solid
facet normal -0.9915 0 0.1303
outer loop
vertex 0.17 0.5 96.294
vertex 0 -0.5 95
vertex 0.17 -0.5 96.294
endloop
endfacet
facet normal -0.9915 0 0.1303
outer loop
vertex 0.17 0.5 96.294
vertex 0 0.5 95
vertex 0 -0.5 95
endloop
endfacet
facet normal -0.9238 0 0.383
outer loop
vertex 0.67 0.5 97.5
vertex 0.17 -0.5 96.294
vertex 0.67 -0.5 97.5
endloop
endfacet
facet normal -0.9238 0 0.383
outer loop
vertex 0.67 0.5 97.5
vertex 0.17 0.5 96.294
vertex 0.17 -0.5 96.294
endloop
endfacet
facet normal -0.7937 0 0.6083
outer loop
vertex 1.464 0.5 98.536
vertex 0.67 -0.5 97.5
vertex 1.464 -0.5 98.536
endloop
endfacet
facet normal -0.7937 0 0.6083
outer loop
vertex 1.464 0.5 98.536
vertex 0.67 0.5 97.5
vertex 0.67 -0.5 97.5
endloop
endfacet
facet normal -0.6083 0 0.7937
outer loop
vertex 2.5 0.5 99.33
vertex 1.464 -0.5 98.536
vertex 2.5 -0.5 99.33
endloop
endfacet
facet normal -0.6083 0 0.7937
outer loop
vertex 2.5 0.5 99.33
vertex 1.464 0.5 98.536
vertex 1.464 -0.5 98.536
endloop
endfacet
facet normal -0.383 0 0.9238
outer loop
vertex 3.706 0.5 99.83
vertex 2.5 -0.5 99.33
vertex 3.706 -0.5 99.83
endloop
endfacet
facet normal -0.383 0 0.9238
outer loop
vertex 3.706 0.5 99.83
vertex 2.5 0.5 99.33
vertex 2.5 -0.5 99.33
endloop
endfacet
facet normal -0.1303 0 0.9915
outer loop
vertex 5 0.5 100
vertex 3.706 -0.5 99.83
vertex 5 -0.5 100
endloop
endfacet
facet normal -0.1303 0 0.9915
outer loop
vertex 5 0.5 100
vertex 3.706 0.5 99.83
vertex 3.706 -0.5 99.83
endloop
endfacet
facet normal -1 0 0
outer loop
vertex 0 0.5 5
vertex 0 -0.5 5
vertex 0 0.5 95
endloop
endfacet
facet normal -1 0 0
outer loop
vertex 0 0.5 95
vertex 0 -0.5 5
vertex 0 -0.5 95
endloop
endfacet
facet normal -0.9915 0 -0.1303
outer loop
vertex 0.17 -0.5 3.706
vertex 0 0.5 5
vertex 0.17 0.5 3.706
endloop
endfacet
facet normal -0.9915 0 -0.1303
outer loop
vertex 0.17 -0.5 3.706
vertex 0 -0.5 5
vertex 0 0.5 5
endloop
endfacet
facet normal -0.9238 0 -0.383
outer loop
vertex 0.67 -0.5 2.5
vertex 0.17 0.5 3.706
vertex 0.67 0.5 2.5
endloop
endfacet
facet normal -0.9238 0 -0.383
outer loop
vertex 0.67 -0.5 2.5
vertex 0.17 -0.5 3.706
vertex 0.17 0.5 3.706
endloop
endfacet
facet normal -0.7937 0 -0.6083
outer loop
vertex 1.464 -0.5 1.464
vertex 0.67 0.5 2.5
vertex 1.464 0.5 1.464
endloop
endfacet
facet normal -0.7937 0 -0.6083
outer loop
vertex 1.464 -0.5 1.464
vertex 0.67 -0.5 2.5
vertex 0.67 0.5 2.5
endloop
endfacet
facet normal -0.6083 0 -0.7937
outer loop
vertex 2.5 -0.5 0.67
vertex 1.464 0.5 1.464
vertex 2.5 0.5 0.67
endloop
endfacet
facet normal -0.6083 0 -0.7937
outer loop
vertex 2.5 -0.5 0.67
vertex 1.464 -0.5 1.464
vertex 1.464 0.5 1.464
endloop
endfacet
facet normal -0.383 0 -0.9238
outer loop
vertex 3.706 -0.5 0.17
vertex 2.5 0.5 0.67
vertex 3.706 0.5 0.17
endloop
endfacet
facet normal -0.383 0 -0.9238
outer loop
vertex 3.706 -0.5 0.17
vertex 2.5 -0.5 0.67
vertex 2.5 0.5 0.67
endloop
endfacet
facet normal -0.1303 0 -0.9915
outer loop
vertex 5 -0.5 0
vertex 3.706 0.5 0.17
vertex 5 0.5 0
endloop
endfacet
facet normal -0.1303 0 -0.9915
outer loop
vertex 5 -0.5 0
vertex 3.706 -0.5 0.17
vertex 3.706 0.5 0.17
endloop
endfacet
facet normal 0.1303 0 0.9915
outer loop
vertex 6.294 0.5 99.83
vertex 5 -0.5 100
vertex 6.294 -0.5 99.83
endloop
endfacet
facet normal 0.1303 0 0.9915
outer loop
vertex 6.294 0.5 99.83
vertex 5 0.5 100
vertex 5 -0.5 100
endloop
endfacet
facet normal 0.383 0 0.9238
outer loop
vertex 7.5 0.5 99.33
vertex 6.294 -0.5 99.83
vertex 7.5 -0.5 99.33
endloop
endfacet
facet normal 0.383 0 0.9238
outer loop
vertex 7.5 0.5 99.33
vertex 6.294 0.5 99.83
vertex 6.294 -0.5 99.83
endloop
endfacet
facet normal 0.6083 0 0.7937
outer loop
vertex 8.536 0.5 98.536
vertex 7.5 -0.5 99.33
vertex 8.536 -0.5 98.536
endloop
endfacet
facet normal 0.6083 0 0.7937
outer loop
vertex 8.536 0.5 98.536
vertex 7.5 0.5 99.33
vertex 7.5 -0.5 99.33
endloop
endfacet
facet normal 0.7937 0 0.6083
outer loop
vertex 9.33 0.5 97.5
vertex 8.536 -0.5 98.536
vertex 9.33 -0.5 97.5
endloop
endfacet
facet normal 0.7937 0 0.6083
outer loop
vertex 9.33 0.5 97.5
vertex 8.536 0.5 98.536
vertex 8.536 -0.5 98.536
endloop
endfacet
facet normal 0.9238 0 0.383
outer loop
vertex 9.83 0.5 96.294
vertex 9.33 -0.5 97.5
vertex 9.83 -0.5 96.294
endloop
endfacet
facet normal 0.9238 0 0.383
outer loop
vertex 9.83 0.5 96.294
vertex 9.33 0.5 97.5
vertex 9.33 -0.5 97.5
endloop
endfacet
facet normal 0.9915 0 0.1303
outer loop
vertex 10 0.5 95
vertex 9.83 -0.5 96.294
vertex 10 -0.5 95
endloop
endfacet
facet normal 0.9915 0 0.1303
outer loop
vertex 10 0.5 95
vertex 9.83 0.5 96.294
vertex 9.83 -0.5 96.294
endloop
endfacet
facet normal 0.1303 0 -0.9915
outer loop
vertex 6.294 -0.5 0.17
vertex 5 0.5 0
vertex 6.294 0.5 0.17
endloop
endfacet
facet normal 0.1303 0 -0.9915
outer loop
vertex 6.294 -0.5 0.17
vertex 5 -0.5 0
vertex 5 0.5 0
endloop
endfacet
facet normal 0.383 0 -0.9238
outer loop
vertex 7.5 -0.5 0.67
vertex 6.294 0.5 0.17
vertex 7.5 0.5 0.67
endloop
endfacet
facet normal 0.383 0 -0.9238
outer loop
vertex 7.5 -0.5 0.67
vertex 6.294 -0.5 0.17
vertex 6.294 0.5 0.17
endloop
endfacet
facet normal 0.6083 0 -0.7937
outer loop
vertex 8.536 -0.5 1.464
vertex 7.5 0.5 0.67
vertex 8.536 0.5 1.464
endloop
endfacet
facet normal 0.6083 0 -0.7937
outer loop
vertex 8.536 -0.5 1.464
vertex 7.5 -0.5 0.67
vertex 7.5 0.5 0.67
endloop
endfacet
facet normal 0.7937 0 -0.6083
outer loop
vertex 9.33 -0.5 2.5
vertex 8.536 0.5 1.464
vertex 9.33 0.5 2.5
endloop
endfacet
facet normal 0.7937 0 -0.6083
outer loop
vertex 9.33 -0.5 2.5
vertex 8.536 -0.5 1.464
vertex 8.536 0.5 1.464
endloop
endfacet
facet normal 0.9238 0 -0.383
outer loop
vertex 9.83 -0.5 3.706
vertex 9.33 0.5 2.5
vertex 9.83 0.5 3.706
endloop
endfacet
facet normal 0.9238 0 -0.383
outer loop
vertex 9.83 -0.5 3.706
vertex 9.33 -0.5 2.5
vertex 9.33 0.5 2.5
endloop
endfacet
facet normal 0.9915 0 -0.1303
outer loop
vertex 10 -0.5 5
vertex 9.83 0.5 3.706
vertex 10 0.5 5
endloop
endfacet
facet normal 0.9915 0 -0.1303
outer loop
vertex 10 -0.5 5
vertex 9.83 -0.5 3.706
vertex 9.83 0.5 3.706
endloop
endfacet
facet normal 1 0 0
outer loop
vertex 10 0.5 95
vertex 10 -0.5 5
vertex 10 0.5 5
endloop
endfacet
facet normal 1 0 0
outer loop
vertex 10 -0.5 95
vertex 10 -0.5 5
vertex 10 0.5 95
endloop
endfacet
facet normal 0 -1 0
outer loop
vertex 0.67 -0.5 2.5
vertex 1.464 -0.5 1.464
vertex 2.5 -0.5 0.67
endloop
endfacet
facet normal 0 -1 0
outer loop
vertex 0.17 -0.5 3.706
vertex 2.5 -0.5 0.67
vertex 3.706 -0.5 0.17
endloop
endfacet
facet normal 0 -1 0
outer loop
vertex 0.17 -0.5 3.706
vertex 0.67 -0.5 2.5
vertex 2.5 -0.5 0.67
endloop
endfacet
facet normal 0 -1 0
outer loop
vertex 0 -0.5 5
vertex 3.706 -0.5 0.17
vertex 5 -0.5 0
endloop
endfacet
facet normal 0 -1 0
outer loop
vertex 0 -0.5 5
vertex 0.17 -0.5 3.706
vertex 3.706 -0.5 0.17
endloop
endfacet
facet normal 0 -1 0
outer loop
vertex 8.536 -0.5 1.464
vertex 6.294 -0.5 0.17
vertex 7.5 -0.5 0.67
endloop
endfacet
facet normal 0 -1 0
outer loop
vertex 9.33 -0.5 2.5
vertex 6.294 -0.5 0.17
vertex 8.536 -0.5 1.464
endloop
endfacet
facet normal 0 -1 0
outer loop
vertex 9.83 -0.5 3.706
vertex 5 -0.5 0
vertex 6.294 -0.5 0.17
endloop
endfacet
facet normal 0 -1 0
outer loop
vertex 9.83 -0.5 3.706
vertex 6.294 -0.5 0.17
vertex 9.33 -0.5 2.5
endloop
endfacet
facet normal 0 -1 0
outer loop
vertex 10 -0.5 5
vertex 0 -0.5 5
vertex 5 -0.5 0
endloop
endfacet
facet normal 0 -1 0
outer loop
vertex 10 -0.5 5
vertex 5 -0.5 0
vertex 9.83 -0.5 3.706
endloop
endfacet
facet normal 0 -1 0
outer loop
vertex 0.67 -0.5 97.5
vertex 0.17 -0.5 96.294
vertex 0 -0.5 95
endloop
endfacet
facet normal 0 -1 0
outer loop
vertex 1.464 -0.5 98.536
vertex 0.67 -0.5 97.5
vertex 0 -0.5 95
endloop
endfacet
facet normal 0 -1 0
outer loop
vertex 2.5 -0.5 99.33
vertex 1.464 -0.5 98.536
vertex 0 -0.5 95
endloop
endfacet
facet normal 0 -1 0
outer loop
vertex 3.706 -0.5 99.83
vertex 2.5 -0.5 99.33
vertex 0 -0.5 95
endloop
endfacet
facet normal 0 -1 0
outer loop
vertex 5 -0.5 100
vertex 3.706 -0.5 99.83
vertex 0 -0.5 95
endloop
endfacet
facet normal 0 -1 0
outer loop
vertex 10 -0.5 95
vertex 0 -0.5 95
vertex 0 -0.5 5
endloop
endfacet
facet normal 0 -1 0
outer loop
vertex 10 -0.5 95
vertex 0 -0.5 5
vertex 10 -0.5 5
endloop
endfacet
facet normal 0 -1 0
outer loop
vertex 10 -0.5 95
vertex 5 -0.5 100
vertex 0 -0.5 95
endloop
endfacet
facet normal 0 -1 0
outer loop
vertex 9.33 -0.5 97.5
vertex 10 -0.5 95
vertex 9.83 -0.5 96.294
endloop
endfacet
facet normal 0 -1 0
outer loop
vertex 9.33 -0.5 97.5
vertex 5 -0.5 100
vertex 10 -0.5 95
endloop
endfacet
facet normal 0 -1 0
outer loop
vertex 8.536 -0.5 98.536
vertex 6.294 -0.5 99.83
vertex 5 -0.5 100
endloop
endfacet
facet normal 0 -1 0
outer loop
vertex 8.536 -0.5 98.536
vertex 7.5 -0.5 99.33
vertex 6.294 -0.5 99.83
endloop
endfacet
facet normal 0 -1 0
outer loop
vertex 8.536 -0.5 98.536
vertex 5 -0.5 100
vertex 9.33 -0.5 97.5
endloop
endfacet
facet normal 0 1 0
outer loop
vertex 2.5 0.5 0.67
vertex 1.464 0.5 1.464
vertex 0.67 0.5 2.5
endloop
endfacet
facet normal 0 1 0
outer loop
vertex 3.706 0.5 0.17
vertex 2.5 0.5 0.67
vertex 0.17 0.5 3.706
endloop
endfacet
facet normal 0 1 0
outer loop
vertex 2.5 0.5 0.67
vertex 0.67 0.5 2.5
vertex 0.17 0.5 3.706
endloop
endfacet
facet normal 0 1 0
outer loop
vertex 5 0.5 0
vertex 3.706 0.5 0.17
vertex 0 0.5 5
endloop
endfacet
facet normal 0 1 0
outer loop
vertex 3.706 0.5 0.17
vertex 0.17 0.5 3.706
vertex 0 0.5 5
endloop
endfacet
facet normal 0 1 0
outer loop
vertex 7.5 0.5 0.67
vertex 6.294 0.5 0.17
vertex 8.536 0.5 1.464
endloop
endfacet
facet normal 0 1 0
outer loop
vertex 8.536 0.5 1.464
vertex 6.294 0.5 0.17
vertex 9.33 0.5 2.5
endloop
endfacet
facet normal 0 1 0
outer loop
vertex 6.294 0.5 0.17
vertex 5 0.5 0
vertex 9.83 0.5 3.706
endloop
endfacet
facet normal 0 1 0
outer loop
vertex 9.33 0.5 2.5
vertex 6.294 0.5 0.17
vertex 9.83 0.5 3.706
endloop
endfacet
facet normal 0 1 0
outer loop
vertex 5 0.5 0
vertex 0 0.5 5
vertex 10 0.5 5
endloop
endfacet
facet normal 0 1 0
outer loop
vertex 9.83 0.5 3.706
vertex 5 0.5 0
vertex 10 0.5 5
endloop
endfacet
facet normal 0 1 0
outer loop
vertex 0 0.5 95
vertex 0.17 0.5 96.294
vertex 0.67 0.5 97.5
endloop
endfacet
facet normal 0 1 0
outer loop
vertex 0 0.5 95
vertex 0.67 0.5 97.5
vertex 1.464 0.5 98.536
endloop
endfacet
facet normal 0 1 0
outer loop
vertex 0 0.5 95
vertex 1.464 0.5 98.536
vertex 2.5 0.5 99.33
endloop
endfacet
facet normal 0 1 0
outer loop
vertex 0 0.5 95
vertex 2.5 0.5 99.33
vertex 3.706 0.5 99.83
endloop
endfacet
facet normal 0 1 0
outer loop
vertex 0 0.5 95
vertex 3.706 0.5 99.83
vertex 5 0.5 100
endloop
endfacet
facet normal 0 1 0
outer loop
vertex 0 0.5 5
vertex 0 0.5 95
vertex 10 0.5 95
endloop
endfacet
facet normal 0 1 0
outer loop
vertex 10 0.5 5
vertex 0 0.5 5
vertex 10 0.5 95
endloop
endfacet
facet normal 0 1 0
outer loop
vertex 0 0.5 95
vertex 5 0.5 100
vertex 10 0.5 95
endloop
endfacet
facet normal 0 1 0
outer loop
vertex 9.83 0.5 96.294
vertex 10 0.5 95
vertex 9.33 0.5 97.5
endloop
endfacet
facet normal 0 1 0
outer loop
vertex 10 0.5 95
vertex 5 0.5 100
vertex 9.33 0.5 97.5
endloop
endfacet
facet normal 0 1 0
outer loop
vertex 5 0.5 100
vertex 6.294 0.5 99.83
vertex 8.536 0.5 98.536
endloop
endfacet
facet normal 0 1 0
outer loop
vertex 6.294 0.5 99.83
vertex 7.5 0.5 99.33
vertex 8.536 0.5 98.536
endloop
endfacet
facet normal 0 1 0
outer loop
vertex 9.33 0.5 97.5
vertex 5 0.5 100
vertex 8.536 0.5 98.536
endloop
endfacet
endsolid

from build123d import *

# Parameters (mm, degrees)
F0_W     = 10
F0_H     = 100
F1_DEPTH = 0.5
F2_R     = 5
F3_R     = 4.99999
F4_R     = 5
F5_R     = 4.99999


# Not quite as in the source:
# - a fillet or chamfer is up to 0.001 mm smaller than in the source, because OpenCascade refuses the exact size


with BuildPart() as f1:
    # F0 (on Front) → F1 (new body, symmetric)
    with BuildSketch(Plane.XZ):
        with Locations((5, 50)):
            Rectangle(F0_W, F0_H)
    extrude(amount=F1_DEPTH, both=True)

    # F2
    f2_edges = [f1.edges().sort_by_distance(p)[0] for p in [
        (0, 0, 100),
    ]]
    fillet(f2_edges, radius=F2_R)

    # F3 (radius 5 in the source; OpenCascade refuses exactly that, so slightly less here)
    f3_edges = [f1.edges().sort_by_distance(p)[0] for p in [
        (10, 0, 100),
    ]]
    fillet(f3_edges, radius=F3_R)

    # F4
    f4_edges = [f1.edges().sort_by_distance(p)[0] for p in [
        (0, 0, 0),
    ]]
    fillet(f4_edges, radius=F4_R)

    # F5 (radius 5 in the source; OpenCascade refuses exactly that, so slightly less here)
    f5_edges = [f1.edges().sort_by_distance(p)[0] for p in [
        (10, 0, 0),
    ]]
    fillet(f5_edges, radius=F5_R)


solid = f1.part
